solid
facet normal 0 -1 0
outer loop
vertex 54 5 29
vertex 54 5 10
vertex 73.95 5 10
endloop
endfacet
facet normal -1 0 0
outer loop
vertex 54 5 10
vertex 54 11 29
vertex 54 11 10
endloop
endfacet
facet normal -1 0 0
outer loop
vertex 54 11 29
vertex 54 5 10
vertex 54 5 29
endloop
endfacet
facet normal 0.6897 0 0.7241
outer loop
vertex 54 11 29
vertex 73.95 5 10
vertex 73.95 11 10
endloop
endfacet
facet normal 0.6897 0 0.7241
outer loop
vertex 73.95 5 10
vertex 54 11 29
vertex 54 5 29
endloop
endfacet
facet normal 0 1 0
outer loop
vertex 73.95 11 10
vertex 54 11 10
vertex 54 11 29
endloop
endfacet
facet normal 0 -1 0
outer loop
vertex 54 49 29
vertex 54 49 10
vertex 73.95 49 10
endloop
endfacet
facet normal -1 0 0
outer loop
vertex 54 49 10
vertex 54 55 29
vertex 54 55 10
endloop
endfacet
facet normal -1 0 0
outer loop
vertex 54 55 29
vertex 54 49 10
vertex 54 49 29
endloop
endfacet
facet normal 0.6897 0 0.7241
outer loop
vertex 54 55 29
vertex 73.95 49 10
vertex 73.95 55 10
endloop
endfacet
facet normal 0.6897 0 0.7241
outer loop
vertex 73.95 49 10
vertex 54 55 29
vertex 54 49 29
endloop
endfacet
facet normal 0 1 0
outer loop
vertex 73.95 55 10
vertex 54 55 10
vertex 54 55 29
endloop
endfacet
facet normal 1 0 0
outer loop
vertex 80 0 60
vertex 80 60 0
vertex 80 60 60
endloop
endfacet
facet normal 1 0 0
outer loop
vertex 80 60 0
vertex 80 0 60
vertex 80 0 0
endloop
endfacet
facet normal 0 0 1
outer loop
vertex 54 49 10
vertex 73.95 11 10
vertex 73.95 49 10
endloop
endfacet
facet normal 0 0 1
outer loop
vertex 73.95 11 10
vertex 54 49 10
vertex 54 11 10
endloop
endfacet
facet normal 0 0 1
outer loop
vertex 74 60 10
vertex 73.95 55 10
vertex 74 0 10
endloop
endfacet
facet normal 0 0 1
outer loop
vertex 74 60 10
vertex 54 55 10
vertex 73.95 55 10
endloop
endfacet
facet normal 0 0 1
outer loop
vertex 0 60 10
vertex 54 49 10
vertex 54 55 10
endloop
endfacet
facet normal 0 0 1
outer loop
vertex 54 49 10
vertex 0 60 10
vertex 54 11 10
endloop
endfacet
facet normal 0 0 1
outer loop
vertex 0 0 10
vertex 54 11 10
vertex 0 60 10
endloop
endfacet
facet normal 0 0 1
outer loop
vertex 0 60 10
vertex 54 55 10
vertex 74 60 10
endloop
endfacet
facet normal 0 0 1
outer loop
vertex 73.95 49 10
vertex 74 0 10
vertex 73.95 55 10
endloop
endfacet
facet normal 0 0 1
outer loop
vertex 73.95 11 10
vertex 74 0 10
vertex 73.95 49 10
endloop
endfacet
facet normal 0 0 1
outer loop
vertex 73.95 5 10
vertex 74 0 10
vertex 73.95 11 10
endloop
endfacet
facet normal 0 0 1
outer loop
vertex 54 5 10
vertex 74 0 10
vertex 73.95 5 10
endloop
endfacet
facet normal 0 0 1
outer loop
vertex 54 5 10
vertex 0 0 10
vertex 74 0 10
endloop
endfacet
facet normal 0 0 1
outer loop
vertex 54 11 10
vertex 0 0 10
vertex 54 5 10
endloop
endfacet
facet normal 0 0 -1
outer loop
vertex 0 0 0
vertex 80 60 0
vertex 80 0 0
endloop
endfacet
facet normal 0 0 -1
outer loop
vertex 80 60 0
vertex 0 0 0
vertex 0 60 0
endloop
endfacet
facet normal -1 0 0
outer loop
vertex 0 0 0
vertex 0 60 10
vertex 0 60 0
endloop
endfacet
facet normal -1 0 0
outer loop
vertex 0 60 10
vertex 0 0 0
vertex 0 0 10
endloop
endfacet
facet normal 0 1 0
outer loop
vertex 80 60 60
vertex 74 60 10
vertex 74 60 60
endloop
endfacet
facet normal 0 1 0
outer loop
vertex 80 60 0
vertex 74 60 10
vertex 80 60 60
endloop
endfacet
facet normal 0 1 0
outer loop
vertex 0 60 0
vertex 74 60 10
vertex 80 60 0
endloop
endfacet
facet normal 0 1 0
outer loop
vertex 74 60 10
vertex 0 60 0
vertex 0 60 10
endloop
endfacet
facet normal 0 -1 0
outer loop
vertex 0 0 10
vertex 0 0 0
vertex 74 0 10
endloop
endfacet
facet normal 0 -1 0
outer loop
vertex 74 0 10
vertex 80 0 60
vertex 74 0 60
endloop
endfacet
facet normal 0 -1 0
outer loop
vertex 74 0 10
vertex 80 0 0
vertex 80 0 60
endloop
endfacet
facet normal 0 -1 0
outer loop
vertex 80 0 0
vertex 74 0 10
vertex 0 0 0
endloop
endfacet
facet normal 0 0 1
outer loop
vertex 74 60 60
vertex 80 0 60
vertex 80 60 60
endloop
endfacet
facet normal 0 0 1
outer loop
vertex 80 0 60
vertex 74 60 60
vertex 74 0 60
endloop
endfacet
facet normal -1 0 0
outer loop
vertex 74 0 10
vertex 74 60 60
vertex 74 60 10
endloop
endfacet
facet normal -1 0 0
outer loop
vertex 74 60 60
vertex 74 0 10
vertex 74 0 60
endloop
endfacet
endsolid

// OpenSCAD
$fn = 32;

// ----------------------------------------------------------------------
// Rib bracket: 2-gusset L bracket
// ----------------------------------------------------------------------

// --- parameters (mm) ---
base_l = 80;              // foot length, X
base_w = 60;              // foot width, Y
base_t = 10;              // foot thickness
plate_t = 6;              // upright plate thickness
plate_h = 60;             // overall height
gus_l = 20;               // gusset leg along the foot
gus_h = 20;               // gusset height
gus_t = 6;                // gusset thickness
gus_edge = 5;             // gusset margin from the foot edge
n_gus = 2;                // gusset count

gus_pitch = (base_w - 2 * gus_edge - gus_t) / (n_gus - 1);  // gusset pitch

union() {
  cube([base_l, base_w, base_t]);
  translate([base_l - plate_t, 0, base_t - 1])
    cube([plate_t, base_w, plate_h - base_t + 1]);
  for (i = [0 : n_gus - 1])
    translate([base_l - plate_t - gus_l, gus_edge + i * gus_pitch, base_t - 1])
      rotate([-90, 0, 0])
        linear_extrude(height = gus_t)
          polygon(points = [[0, 0], [gus_l + 1, 0], [0, -gus_h]]);
}
